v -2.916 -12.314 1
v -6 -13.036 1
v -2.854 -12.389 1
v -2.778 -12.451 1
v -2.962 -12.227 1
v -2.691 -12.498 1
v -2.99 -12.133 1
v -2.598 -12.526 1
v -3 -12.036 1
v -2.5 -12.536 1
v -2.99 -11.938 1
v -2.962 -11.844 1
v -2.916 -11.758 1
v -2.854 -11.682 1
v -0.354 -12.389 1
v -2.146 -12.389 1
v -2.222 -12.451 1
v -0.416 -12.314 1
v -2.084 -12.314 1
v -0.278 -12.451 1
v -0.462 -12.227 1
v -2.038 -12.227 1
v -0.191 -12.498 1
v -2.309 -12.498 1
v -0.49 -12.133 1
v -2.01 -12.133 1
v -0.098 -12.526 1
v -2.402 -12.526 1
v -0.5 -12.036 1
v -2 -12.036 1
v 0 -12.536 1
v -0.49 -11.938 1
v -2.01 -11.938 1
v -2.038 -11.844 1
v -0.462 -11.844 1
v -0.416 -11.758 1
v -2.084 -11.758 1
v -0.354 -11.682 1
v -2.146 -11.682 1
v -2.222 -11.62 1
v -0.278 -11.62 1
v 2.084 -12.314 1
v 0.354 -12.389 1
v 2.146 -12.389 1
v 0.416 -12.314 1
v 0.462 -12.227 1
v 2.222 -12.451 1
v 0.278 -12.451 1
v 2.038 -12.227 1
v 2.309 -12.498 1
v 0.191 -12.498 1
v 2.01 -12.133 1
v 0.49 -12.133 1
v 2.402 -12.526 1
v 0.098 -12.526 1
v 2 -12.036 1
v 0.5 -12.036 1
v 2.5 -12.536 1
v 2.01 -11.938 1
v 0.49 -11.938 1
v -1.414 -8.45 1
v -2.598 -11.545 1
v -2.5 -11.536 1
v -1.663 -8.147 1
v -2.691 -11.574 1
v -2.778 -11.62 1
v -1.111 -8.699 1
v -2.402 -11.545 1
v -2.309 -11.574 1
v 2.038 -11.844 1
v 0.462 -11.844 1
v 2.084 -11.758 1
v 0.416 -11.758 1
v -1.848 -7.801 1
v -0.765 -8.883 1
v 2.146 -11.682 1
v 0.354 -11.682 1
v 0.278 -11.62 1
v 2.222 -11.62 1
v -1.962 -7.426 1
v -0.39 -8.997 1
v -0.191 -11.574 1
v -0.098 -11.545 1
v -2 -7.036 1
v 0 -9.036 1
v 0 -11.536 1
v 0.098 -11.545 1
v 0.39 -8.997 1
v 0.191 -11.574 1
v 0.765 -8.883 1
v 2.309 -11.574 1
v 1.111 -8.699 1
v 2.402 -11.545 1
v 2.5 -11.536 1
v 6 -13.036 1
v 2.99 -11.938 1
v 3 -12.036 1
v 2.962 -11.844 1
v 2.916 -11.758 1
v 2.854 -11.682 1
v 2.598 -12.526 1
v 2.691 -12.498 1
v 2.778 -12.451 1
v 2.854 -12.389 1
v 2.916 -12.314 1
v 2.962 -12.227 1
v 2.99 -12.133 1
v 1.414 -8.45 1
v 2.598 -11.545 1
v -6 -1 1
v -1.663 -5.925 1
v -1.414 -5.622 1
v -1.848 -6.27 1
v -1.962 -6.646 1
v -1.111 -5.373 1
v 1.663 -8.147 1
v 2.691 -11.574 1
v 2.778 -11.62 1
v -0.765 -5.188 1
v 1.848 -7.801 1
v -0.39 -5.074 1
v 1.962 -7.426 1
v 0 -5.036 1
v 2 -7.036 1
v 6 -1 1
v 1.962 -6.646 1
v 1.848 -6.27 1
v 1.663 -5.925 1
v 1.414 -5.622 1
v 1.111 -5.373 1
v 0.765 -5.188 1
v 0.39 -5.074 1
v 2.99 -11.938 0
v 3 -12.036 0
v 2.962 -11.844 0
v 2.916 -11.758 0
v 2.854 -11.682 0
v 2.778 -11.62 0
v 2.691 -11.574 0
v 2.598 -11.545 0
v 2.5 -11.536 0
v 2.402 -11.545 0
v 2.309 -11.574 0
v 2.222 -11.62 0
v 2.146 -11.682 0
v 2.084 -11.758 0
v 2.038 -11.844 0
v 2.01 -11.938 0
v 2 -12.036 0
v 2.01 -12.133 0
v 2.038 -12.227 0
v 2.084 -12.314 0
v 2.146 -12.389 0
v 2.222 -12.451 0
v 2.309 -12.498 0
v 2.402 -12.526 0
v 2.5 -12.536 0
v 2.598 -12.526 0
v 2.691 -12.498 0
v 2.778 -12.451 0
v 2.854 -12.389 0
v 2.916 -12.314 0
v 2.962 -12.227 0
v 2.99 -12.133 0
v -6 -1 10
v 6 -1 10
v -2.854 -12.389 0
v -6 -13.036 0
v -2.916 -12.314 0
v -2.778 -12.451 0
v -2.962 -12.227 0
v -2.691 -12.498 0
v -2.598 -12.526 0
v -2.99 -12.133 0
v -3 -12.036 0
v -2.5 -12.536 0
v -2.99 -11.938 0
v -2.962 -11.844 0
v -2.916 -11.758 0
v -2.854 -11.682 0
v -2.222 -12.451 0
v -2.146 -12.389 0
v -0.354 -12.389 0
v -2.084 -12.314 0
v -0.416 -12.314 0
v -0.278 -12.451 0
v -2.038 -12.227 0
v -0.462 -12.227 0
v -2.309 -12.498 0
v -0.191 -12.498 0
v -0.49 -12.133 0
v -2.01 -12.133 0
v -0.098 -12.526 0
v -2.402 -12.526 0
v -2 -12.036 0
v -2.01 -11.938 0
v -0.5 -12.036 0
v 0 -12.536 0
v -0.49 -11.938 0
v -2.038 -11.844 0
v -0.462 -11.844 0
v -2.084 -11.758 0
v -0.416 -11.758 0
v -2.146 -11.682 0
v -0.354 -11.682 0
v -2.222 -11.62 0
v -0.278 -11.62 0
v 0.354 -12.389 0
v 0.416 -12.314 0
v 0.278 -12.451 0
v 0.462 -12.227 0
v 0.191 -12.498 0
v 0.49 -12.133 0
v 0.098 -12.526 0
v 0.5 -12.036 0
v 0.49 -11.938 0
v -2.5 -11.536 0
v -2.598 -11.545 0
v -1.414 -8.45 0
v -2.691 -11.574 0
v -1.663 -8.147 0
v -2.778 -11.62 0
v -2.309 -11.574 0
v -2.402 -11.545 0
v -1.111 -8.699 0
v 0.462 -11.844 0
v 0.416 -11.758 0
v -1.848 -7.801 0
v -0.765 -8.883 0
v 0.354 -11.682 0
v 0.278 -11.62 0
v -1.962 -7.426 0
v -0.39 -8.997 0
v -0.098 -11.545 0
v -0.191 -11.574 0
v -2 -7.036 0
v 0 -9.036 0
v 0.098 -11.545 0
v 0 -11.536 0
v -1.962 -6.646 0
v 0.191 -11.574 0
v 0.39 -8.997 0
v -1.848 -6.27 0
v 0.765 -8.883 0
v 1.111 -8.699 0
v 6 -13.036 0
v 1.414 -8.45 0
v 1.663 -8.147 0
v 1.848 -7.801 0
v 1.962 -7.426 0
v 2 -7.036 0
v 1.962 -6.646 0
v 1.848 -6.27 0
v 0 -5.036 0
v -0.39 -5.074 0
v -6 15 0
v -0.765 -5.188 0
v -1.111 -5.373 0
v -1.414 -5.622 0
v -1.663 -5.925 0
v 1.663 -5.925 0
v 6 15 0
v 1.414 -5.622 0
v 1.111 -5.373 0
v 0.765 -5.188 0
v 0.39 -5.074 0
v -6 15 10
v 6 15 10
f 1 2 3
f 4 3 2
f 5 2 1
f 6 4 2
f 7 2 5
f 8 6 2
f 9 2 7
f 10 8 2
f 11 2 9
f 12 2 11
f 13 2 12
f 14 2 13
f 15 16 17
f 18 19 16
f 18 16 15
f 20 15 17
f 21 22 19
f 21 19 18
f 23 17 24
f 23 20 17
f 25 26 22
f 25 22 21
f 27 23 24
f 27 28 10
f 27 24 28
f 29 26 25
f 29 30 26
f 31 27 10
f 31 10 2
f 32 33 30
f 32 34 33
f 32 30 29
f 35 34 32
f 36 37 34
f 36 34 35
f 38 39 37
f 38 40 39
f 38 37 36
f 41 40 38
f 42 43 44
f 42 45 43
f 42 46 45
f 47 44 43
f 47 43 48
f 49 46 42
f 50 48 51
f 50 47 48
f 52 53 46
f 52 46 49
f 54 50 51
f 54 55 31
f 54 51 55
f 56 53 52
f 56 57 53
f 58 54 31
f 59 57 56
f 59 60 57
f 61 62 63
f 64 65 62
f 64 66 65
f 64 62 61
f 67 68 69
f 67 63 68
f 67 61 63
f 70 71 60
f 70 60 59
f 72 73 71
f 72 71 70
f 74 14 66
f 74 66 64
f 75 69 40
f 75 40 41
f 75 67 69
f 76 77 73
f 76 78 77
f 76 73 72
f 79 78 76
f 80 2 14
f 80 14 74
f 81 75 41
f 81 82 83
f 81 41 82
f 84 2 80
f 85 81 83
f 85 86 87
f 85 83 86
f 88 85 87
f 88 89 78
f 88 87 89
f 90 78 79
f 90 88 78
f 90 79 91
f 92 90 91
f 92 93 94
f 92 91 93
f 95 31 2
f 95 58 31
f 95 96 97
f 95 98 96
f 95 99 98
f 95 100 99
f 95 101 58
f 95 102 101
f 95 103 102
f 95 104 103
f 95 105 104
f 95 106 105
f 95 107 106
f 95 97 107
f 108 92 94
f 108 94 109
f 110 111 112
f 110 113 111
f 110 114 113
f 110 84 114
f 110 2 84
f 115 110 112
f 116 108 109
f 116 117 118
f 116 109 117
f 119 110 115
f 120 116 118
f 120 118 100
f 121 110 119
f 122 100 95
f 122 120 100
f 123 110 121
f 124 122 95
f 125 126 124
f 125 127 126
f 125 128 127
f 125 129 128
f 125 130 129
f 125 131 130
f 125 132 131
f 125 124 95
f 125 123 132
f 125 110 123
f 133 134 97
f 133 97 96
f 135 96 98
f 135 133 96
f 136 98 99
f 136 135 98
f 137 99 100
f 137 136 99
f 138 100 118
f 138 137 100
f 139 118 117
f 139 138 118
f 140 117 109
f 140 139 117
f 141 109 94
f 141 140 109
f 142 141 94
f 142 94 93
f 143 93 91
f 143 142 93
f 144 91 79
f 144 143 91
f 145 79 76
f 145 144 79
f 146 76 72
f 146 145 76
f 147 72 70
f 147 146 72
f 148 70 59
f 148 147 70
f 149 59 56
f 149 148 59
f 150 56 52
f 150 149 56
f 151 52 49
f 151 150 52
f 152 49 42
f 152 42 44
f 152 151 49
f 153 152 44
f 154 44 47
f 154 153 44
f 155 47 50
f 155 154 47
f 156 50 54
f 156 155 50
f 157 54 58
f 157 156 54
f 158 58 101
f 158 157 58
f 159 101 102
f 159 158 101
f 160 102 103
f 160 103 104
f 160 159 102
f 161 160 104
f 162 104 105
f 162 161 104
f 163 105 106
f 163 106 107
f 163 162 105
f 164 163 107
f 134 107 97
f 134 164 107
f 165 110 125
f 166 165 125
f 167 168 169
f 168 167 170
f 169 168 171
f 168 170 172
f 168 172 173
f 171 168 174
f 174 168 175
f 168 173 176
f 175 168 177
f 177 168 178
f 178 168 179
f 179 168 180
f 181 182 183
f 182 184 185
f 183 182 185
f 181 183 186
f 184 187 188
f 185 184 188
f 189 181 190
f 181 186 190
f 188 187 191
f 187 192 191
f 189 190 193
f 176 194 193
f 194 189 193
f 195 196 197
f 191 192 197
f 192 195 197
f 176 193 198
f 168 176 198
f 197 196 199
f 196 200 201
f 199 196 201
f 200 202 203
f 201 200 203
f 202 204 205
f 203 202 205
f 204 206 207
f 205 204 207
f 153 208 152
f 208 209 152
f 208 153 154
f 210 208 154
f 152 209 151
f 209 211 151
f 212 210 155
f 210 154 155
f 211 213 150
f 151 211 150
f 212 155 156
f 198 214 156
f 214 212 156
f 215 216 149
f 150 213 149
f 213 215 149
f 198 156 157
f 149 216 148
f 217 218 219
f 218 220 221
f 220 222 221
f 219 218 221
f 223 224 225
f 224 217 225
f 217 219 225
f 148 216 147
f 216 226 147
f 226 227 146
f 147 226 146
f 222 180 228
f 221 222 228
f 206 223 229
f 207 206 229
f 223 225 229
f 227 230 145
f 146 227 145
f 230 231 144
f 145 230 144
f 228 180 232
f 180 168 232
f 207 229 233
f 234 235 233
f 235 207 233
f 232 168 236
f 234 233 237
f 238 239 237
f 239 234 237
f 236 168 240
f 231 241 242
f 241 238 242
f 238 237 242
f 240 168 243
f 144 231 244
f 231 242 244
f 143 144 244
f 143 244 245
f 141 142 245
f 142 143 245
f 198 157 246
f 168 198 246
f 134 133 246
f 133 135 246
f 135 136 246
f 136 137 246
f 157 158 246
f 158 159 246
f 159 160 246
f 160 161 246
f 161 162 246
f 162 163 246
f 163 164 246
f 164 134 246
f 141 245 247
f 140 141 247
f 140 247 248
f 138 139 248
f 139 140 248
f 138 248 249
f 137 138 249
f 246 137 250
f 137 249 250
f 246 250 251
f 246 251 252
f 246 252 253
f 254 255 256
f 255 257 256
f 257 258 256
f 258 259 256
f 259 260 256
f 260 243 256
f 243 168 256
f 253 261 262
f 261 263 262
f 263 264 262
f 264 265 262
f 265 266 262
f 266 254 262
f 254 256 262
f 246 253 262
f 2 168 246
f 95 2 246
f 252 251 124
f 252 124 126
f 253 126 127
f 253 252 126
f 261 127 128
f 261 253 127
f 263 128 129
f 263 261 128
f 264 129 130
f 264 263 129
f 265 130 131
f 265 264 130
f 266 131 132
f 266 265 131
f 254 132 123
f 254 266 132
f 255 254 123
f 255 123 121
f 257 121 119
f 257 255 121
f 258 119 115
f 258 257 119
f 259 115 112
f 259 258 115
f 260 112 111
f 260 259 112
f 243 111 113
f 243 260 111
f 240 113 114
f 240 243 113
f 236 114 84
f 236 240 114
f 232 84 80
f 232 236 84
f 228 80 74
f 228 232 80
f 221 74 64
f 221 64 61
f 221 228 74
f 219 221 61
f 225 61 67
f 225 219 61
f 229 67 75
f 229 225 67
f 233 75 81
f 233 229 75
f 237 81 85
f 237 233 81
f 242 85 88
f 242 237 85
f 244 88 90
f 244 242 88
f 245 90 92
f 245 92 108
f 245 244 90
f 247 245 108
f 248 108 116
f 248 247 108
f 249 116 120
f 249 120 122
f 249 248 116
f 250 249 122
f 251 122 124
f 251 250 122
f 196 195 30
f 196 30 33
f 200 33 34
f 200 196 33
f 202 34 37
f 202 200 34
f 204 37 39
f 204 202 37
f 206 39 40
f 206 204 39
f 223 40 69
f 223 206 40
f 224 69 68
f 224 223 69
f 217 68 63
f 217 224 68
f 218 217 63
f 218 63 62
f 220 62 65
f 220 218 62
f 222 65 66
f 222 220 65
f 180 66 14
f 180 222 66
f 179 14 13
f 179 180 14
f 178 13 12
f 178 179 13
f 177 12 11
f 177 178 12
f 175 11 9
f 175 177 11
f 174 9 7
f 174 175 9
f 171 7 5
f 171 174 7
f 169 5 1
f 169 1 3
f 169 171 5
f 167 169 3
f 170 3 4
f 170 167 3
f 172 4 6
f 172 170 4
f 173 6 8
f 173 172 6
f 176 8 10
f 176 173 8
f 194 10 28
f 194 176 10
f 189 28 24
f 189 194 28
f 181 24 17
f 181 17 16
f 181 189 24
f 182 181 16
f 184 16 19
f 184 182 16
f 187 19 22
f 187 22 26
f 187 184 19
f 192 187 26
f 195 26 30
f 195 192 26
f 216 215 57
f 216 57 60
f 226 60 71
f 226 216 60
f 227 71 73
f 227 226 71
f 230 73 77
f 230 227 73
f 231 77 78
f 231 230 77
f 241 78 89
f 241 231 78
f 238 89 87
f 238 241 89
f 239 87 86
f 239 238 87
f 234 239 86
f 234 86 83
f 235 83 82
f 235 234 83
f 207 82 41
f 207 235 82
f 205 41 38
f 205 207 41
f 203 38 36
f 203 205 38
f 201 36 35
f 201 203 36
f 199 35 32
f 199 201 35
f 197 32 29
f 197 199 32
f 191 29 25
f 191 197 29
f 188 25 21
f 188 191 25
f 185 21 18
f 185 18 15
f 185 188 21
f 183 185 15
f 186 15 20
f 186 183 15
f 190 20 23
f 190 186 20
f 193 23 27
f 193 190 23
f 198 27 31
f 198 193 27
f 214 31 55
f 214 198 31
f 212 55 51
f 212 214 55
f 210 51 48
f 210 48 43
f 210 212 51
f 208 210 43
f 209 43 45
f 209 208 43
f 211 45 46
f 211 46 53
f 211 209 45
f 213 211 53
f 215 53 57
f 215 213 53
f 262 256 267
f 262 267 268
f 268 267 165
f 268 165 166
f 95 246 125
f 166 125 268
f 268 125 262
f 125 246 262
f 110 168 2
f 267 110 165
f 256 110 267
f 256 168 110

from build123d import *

# Parameters (mm, degrees)
SKETCH_W   = 12
SKETCH_H   = 28
SKETCH_R   = 0.5
SKETCH_R_2 = 2
PAD_DEPTH  = 1
BOX_W      = 12
BOX_H      = 16
BOX_DEPTH  = 10


with BuildPart() as pad:
    # Sketch → Pad (new body)
    with BuildSketch(Plane.XY):
        with Locations((0, 0.964269)):
            Rectangle(SKETCH_W, SKETCH_H)
        with Locations((0, -12.035731)):
            Circle(SKETCH_R, mode=Mode.SUBTRACT)
        with Locations((2.5, -12.035731)):
            Circle(SKETCH_R, mode=Mode.SUBTRACT)
        with Locations((-2.5, -12.035731)):
            Circle(SKETCH_R, mode=Mode.SUBTRACT)
        with Locations((0, -7.035731)):
            Circle(SKETCH_R_2, mode=Mode.SUBTRACT)
    extrude(amount=PAD_DEPTH)


with BuildPart() as fusion:
    # Box → Box (new body)
    with BuildSketch(Plane(origin=(-6, -1, 0), x_dir=(1, 0, 0), z_dir=(0, 0, 1))):
        with Locations((6, 8)):
            Rectangle(BOX_W, BOX_H)
    extrude(amount=BOX_DEPTH)

    # Fusion: union Pad
    add(pad.part)


solid = fusion.part
